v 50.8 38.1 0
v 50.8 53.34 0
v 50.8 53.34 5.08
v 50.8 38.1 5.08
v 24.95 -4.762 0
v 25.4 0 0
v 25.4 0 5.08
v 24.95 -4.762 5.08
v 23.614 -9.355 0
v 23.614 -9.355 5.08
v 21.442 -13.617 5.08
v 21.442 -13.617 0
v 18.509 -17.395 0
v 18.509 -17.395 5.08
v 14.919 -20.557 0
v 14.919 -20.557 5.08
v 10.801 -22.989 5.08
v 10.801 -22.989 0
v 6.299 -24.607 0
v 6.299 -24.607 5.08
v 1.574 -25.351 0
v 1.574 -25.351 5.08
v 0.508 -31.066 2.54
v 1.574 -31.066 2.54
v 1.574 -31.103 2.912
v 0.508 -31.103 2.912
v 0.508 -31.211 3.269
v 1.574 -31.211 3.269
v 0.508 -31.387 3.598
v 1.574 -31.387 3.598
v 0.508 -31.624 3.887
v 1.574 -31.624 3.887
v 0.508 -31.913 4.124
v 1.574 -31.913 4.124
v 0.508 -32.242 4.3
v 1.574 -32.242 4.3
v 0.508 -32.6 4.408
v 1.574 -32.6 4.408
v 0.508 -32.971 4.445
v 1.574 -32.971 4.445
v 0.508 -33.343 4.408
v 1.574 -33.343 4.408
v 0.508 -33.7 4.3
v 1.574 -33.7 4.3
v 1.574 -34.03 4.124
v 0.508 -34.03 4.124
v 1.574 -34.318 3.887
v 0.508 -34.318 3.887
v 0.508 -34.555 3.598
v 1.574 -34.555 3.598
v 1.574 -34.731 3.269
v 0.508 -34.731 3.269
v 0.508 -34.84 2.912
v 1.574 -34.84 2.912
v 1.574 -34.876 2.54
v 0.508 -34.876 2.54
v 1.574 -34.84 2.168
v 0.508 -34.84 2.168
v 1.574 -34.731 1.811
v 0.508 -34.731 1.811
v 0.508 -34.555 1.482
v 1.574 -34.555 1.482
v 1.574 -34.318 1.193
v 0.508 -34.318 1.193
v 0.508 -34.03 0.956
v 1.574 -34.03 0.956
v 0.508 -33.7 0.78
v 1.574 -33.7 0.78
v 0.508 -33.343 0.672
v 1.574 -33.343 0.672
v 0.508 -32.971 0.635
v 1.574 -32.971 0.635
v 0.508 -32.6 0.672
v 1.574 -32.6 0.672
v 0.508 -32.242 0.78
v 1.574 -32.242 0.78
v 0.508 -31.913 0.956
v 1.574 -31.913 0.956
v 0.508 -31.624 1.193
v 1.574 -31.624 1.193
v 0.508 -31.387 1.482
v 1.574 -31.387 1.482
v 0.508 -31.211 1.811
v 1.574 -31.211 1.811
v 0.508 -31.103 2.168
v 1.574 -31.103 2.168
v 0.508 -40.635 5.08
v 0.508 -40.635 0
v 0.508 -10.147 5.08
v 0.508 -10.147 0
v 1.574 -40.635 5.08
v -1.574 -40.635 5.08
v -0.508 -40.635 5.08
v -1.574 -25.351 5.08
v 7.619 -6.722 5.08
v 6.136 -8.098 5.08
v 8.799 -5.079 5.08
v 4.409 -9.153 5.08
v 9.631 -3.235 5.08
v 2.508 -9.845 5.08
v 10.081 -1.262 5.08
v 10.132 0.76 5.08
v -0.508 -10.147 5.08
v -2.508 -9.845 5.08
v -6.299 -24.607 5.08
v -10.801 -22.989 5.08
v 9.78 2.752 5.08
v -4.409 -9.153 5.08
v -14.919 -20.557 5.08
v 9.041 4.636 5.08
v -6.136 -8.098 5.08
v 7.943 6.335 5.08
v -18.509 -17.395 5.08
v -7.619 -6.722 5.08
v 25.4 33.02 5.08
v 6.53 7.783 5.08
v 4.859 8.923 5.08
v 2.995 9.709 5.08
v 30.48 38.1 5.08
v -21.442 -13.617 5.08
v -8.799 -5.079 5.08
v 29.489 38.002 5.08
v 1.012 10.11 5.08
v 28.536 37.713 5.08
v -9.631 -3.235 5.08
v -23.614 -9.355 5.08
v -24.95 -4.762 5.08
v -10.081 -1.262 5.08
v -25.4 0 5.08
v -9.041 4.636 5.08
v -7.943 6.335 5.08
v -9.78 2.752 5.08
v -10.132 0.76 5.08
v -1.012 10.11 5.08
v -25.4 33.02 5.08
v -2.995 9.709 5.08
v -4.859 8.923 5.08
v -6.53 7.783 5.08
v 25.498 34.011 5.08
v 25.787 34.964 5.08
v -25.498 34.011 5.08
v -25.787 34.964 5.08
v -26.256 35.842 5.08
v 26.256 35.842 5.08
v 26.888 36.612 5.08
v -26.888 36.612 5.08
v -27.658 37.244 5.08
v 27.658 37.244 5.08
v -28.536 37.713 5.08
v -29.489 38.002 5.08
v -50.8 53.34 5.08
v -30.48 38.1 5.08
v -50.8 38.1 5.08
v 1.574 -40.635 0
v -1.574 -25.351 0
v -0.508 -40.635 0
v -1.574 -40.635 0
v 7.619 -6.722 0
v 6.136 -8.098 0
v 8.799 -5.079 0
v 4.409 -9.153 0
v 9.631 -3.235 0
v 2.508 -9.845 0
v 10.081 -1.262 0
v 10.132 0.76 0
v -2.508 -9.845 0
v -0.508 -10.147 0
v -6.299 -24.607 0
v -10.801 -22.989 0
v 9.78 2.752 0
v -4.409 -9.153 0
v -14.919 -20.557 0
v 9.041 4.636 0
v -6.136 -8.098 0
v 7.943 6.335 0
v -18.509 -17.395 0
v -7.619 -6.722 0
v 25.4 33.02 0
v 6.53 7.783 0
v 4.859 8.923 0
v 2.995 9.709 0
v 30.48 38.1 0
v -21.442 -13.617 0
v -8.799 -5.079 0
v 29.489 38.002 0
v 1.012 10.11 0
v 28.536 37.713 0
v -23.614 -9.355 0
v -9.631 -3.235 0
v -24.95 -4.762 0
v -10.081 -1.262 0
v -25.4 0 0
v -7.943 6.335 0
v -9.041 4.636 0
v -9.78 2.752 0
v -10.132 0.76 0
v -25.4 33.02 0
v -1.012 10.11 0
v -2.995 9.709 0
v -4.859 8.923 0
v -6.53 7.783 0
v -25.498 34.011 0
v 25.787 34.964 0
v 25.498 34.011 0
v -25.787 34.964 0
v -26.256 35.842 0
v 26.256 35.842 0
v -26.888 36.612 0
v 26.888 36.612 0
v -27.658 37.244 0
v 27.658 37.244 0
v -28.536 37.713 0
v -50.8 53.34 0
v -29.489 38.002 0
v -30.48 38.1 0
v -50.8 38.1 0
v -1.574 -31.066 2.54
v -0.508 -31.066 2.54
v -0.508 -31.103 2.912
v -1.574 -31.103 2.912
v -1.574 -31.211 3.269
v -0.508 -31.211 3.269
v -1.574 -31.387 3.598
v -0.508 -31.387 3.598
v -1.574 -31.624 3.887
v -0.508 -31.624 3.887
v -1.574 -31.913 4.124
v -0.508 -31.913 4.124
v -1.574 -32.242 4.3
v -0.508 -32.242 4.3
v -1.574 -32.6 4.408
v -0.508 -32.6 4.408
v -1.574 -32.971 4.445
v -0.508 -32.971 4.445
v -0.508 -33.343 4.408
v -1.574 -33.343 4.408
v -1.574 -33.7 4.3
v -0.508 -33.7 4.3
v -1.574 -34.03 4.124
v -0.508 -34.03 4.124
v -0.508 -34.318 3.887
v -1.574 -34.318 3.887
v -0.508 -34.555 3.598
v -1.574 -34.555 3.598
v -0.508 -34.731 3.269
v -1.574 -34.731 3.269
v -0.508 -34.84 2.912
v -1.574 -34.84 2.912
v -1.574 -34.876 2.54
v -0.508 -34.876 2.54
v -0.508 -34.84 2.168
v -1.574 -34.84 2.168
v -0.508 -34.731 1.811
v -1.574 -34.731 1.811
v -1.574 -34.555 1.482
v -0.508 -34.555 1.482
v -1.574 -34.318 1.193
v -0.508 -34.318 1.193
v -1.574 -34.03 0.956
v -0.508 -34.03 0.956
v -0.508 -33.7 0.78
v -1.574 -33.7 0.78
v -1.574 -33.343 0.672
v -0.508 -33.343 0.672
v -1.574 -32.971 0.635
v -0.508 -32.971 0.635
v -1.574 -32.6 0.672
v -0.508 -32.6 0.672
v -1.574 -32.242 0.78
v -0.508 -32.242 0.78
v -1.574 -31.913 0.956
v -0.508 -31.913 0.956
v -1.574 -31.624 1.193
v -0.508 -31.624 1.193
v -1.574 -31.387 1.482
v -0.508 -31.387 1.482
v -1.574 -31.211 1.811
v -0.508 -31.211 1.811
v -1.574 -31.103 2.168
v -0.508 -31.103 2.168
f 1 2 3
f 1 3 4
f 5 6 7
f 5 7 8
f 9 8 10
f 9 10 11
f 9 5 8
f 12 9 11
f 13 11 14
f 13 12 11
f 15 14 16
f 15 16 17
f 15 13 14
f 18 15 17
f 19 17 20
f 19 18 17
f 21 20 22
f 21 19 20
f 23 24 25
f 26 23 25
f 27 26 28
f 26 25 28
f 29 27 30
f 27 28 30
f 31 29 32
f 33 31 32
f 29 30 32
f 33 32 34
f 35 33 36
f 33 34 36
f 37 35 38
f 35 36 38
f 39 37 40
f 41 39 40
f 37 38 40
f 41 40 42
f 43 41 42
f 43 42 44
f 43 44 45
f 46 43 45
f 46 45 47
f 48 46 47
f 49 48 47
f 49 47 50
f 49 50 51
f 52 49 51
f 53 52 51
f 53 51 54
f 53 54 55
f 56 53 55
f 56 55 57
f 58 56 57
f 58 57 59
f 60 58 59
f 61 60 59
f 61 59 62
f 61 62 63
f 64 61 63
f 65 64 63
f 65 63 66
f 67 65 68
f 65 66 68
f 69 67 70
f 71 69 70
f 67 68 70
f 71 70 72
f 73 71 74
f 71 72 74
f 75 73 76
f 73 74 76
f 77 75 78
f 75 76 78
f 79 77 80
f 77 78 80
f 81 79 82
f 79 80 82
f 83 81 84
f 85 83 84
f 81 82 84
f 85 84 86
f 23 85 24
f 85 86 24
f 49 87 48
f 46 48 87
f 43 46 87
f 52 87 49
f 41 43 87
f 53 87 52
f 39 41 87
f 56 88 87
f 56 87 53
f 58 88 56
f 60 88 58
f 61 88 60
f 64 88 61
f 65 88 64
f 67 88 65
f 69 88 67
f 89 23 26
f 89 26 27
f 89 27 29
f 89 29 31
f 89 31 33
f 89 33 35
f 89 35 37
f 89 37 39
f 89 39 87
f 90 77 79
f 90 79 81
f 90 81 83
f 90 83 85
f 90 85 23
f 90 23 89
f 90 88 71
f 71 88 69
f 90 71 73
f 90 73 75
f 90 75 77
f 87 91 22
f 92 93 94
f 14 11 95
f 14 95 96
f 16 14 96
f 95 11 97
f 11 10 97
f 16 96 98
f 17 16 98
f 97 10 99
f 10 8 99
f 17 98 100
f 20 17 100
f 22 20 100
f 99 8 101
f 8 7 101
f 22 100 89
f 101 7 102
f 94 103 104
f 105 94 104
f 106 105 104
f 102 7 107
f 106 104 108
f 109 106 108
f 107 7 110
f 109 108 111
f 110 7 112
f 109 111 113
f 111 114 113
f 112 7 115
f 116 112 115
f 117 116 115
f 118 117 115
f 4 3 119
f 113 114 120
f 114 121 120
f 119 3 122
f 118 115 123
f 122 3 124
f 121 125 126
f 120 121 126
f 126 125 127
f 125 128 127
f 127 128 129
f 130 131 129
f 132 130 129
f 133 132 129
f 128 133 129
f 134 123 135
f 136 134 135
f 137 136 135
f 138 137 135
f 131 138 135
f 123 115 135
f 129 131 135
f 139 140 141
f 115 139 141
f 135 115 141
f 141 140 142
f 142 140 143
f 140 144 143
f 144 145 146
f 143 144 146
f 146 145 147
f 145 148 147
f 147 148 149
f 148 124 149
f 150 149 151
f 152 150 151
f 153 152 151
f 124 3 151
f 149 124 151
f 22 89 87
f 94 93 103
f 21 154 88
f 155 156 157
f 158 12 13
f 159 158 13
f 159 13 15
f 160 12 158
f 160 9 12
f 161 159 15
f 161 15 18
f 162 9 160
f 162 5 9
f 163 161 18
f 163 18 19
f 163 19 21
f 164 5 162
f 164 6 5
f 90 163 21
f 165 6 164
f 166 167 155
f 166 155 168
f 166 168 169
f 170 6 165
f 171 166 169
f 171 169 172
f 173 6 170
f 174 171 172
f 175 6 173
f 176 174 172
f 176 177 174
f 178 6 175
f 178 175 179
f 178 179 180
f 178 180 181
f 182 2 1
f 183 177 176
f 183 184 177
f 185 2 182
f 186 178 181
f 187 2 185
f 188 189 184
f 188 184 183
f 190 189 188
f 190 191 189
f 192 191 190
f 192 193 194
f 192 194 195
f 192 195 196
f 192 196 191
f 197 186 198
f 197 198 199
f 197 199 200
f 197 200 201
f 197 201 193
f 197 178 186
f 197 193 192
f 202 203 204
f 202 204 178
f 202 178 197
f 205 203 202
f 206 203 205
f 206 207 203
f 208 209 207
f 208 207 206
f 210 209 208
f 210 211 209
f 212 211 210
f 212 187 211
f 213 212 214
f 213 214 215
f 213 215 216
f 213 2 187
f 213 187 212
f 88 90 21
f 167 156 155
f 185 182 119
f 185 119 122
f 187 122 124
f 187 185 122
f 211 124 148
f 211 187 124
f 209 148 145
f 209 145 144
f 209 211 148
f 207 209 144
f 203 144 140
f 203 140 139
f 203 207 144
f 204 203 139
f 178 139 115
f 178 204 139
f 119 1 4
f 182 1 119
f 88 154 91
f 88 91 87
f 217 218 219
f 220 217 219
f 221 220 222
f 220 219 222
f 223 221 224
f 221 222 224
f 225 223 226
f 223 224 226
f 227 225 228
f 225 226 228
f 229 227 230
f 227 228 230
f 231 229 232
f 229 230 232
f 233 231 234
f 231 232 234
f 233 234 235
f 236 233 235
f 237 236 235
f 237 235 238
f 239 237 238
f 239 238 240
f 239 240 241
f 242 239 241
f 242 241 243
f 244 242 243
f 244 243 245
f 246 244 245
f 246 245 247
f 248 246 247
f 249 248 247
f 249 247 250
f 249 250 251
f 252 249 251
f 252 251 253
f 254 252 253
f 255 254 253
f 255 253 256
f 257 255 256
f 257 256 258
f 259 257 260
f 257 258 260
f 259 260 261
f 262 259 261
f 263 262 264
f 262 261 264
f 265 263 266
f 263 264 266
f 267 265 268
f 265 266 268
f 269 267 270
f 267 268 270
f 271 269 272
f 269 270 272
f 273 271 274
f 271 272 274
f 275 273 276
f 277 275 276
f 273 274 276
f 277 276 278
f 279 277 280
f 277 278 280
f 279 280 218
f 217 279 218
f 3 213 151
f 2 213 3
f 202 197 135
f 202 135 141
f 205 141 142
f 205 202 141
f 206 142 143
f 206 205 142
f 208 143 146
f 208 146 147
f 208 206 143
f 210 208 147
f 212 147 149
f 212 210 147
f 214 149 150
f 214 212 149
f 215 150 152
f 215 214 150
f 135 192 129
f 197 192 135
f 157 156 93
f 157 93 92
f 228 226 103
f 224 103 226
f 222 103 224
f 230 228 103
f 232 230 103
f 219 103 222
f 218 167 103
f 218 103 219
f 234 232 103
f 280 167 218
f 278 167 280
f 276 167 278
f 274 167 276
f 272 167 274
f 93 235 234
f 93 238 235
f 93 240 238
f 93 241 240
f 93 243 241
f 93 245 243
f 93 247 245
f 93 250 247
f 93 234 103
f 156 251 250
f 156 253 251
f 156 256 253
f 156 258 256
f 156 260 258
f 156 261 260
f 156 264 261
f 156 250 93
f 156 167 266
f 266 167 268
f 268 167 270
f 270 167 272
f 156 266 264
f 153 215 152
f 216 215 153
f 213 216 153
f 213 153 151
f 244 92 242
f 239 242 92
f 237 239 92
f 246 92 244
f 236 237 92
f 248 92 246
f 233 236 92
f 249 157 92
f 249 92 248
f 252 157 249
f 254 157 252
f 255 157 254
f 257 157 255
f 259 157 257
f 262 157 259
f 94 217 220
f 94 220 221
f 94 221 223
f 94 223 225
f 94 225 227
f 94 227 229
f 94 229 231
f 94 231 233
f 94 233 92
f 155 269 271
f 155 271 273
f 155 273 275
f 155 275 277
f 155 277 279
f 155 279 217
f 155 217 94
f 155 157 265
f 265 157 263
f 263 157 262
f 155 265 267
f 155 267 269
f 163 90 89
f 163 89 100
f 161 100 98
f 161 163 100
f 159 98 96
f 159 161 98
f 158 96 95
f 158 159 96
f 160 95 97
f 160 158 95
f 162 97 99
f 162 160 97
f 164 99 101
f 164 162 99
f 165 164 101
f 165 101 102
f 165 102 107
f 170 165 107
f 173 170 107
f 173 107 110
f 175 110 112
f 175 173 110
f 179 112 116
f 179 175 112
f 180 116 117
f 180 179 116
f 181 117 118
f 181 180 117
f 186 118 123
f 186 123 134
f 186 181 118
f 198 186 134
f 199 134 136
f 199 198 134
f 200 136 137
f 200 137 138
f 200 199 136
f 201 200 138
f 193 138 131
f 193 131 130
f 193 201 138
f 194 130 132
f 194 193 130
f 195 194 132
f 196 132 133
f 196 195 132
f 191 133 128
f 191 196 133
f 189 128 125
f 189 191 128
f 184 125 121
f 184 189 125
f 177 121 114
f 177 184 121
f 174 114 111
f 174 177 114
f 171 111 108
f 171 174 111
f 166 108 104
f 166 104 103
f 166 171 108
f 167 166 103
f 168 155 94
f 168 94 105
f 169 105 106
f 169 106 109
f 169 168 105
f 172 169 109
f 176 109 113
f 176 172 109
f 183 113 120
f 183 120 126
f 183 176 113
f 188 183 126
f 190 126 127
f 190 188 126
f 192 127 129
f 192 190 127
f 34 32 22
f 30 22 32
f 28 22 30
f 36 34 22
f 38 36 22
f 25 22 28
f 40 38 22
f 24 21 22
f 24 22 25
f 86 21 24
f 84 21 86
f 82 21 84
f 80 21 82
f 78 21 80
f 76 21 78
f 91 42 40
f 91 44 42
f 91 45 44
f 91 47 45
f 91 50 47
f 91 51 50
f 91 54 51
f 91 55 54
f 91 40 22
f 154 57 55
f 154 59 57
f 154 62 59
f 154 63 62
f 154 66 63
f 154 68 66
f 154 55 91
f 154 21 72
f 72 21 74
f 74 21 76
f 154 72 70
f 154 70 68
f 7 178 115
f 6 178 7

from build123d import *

# Parameters (mm, degrees)
BOSS_EXTRUDE1_DEPTH = 5.08
SKETCH4_R           = 1.905
CUT_EXTRUDE2_DEPTH  = 75.926658634


with BuildPart() as part:
    # Sketch1 → Boss-Extrude1 (new body)
    with BuildSketch(Plane.XY):
        with BuildLine():
            Line((-25.4, 0), (-25.4, 33.02))
            ThreePointArc((-25.4, 33.02), (-26.887897552, 36.612102448), (-30.48, 38.1))
            Line((-30.48, 38.1), (-50.8, 38.1))
            Line((-50.8, 38.1), (-50.8, 53.34))
            Line((-50.8, 53.34), (50.8, 53.34))
            Line((50.8, 53.34), (50.8, 38.1))
            Line((50.8, 38.1), (30.48, 38.1))
            ThreePointArc((30.48, 38.1), (26.887897552, 36.612102448), (25.4, 33.02))
            Line((25.4, 33.02), (25.4, 0))
            ThreePointArc((25.4, 0), (18.508661853, -17.395098057), (1.574060126, -25.351180145))
            Line((1.574060126, -25.351180145), (1.574060126, -40.634919492))
            Line((1.574060126, -40.634919492), (0.508, -40.634919492))
            Line((0.508, -40.634919492), (0.508, -25.394919492))
            Line((0.508, -25.394919492), (0.508, -10.147292053))
            ThreePointArc((0.508, -10.147292053), (0, 10.16), (-0.508, -10.147292053))
            Line((-0.508, -10.147292053), (-0.508, -25.394919492))
            Line((-0.508, -25.394919492), (-0.508, -40.634919492))
            Line((-0.508, -40.634919492), (-1.574060126, -40.634919492))
            Line((-1.574060126, -40.634919492), (-1.574060126, -25.351180145))
            ThreePointArc((-1.574060126, -25.351180145), (-18.508661853, -17.395098057), (-25.4, 0))
        make_face()
    extrude(amount=BOSS_EXTRUDE1_DEPTH)

    # Sketch4 → Cut-Extrude2 (cut, through all)
    with BuildSketch(Plane(origin=(1.574060126, 0, 0), x_dir=(0, 0, -1), z_dir=(1, 0, 0))):
        with Locations(Location((-2.54, -32.971180145, 0), (0, 0, 90))):
            Circle(SKETCH4_R)
    extrude(amount=-CUT_EXTRUDE2_DEPTH, mode=Mode.SUBTRACT)


solid = part.part
